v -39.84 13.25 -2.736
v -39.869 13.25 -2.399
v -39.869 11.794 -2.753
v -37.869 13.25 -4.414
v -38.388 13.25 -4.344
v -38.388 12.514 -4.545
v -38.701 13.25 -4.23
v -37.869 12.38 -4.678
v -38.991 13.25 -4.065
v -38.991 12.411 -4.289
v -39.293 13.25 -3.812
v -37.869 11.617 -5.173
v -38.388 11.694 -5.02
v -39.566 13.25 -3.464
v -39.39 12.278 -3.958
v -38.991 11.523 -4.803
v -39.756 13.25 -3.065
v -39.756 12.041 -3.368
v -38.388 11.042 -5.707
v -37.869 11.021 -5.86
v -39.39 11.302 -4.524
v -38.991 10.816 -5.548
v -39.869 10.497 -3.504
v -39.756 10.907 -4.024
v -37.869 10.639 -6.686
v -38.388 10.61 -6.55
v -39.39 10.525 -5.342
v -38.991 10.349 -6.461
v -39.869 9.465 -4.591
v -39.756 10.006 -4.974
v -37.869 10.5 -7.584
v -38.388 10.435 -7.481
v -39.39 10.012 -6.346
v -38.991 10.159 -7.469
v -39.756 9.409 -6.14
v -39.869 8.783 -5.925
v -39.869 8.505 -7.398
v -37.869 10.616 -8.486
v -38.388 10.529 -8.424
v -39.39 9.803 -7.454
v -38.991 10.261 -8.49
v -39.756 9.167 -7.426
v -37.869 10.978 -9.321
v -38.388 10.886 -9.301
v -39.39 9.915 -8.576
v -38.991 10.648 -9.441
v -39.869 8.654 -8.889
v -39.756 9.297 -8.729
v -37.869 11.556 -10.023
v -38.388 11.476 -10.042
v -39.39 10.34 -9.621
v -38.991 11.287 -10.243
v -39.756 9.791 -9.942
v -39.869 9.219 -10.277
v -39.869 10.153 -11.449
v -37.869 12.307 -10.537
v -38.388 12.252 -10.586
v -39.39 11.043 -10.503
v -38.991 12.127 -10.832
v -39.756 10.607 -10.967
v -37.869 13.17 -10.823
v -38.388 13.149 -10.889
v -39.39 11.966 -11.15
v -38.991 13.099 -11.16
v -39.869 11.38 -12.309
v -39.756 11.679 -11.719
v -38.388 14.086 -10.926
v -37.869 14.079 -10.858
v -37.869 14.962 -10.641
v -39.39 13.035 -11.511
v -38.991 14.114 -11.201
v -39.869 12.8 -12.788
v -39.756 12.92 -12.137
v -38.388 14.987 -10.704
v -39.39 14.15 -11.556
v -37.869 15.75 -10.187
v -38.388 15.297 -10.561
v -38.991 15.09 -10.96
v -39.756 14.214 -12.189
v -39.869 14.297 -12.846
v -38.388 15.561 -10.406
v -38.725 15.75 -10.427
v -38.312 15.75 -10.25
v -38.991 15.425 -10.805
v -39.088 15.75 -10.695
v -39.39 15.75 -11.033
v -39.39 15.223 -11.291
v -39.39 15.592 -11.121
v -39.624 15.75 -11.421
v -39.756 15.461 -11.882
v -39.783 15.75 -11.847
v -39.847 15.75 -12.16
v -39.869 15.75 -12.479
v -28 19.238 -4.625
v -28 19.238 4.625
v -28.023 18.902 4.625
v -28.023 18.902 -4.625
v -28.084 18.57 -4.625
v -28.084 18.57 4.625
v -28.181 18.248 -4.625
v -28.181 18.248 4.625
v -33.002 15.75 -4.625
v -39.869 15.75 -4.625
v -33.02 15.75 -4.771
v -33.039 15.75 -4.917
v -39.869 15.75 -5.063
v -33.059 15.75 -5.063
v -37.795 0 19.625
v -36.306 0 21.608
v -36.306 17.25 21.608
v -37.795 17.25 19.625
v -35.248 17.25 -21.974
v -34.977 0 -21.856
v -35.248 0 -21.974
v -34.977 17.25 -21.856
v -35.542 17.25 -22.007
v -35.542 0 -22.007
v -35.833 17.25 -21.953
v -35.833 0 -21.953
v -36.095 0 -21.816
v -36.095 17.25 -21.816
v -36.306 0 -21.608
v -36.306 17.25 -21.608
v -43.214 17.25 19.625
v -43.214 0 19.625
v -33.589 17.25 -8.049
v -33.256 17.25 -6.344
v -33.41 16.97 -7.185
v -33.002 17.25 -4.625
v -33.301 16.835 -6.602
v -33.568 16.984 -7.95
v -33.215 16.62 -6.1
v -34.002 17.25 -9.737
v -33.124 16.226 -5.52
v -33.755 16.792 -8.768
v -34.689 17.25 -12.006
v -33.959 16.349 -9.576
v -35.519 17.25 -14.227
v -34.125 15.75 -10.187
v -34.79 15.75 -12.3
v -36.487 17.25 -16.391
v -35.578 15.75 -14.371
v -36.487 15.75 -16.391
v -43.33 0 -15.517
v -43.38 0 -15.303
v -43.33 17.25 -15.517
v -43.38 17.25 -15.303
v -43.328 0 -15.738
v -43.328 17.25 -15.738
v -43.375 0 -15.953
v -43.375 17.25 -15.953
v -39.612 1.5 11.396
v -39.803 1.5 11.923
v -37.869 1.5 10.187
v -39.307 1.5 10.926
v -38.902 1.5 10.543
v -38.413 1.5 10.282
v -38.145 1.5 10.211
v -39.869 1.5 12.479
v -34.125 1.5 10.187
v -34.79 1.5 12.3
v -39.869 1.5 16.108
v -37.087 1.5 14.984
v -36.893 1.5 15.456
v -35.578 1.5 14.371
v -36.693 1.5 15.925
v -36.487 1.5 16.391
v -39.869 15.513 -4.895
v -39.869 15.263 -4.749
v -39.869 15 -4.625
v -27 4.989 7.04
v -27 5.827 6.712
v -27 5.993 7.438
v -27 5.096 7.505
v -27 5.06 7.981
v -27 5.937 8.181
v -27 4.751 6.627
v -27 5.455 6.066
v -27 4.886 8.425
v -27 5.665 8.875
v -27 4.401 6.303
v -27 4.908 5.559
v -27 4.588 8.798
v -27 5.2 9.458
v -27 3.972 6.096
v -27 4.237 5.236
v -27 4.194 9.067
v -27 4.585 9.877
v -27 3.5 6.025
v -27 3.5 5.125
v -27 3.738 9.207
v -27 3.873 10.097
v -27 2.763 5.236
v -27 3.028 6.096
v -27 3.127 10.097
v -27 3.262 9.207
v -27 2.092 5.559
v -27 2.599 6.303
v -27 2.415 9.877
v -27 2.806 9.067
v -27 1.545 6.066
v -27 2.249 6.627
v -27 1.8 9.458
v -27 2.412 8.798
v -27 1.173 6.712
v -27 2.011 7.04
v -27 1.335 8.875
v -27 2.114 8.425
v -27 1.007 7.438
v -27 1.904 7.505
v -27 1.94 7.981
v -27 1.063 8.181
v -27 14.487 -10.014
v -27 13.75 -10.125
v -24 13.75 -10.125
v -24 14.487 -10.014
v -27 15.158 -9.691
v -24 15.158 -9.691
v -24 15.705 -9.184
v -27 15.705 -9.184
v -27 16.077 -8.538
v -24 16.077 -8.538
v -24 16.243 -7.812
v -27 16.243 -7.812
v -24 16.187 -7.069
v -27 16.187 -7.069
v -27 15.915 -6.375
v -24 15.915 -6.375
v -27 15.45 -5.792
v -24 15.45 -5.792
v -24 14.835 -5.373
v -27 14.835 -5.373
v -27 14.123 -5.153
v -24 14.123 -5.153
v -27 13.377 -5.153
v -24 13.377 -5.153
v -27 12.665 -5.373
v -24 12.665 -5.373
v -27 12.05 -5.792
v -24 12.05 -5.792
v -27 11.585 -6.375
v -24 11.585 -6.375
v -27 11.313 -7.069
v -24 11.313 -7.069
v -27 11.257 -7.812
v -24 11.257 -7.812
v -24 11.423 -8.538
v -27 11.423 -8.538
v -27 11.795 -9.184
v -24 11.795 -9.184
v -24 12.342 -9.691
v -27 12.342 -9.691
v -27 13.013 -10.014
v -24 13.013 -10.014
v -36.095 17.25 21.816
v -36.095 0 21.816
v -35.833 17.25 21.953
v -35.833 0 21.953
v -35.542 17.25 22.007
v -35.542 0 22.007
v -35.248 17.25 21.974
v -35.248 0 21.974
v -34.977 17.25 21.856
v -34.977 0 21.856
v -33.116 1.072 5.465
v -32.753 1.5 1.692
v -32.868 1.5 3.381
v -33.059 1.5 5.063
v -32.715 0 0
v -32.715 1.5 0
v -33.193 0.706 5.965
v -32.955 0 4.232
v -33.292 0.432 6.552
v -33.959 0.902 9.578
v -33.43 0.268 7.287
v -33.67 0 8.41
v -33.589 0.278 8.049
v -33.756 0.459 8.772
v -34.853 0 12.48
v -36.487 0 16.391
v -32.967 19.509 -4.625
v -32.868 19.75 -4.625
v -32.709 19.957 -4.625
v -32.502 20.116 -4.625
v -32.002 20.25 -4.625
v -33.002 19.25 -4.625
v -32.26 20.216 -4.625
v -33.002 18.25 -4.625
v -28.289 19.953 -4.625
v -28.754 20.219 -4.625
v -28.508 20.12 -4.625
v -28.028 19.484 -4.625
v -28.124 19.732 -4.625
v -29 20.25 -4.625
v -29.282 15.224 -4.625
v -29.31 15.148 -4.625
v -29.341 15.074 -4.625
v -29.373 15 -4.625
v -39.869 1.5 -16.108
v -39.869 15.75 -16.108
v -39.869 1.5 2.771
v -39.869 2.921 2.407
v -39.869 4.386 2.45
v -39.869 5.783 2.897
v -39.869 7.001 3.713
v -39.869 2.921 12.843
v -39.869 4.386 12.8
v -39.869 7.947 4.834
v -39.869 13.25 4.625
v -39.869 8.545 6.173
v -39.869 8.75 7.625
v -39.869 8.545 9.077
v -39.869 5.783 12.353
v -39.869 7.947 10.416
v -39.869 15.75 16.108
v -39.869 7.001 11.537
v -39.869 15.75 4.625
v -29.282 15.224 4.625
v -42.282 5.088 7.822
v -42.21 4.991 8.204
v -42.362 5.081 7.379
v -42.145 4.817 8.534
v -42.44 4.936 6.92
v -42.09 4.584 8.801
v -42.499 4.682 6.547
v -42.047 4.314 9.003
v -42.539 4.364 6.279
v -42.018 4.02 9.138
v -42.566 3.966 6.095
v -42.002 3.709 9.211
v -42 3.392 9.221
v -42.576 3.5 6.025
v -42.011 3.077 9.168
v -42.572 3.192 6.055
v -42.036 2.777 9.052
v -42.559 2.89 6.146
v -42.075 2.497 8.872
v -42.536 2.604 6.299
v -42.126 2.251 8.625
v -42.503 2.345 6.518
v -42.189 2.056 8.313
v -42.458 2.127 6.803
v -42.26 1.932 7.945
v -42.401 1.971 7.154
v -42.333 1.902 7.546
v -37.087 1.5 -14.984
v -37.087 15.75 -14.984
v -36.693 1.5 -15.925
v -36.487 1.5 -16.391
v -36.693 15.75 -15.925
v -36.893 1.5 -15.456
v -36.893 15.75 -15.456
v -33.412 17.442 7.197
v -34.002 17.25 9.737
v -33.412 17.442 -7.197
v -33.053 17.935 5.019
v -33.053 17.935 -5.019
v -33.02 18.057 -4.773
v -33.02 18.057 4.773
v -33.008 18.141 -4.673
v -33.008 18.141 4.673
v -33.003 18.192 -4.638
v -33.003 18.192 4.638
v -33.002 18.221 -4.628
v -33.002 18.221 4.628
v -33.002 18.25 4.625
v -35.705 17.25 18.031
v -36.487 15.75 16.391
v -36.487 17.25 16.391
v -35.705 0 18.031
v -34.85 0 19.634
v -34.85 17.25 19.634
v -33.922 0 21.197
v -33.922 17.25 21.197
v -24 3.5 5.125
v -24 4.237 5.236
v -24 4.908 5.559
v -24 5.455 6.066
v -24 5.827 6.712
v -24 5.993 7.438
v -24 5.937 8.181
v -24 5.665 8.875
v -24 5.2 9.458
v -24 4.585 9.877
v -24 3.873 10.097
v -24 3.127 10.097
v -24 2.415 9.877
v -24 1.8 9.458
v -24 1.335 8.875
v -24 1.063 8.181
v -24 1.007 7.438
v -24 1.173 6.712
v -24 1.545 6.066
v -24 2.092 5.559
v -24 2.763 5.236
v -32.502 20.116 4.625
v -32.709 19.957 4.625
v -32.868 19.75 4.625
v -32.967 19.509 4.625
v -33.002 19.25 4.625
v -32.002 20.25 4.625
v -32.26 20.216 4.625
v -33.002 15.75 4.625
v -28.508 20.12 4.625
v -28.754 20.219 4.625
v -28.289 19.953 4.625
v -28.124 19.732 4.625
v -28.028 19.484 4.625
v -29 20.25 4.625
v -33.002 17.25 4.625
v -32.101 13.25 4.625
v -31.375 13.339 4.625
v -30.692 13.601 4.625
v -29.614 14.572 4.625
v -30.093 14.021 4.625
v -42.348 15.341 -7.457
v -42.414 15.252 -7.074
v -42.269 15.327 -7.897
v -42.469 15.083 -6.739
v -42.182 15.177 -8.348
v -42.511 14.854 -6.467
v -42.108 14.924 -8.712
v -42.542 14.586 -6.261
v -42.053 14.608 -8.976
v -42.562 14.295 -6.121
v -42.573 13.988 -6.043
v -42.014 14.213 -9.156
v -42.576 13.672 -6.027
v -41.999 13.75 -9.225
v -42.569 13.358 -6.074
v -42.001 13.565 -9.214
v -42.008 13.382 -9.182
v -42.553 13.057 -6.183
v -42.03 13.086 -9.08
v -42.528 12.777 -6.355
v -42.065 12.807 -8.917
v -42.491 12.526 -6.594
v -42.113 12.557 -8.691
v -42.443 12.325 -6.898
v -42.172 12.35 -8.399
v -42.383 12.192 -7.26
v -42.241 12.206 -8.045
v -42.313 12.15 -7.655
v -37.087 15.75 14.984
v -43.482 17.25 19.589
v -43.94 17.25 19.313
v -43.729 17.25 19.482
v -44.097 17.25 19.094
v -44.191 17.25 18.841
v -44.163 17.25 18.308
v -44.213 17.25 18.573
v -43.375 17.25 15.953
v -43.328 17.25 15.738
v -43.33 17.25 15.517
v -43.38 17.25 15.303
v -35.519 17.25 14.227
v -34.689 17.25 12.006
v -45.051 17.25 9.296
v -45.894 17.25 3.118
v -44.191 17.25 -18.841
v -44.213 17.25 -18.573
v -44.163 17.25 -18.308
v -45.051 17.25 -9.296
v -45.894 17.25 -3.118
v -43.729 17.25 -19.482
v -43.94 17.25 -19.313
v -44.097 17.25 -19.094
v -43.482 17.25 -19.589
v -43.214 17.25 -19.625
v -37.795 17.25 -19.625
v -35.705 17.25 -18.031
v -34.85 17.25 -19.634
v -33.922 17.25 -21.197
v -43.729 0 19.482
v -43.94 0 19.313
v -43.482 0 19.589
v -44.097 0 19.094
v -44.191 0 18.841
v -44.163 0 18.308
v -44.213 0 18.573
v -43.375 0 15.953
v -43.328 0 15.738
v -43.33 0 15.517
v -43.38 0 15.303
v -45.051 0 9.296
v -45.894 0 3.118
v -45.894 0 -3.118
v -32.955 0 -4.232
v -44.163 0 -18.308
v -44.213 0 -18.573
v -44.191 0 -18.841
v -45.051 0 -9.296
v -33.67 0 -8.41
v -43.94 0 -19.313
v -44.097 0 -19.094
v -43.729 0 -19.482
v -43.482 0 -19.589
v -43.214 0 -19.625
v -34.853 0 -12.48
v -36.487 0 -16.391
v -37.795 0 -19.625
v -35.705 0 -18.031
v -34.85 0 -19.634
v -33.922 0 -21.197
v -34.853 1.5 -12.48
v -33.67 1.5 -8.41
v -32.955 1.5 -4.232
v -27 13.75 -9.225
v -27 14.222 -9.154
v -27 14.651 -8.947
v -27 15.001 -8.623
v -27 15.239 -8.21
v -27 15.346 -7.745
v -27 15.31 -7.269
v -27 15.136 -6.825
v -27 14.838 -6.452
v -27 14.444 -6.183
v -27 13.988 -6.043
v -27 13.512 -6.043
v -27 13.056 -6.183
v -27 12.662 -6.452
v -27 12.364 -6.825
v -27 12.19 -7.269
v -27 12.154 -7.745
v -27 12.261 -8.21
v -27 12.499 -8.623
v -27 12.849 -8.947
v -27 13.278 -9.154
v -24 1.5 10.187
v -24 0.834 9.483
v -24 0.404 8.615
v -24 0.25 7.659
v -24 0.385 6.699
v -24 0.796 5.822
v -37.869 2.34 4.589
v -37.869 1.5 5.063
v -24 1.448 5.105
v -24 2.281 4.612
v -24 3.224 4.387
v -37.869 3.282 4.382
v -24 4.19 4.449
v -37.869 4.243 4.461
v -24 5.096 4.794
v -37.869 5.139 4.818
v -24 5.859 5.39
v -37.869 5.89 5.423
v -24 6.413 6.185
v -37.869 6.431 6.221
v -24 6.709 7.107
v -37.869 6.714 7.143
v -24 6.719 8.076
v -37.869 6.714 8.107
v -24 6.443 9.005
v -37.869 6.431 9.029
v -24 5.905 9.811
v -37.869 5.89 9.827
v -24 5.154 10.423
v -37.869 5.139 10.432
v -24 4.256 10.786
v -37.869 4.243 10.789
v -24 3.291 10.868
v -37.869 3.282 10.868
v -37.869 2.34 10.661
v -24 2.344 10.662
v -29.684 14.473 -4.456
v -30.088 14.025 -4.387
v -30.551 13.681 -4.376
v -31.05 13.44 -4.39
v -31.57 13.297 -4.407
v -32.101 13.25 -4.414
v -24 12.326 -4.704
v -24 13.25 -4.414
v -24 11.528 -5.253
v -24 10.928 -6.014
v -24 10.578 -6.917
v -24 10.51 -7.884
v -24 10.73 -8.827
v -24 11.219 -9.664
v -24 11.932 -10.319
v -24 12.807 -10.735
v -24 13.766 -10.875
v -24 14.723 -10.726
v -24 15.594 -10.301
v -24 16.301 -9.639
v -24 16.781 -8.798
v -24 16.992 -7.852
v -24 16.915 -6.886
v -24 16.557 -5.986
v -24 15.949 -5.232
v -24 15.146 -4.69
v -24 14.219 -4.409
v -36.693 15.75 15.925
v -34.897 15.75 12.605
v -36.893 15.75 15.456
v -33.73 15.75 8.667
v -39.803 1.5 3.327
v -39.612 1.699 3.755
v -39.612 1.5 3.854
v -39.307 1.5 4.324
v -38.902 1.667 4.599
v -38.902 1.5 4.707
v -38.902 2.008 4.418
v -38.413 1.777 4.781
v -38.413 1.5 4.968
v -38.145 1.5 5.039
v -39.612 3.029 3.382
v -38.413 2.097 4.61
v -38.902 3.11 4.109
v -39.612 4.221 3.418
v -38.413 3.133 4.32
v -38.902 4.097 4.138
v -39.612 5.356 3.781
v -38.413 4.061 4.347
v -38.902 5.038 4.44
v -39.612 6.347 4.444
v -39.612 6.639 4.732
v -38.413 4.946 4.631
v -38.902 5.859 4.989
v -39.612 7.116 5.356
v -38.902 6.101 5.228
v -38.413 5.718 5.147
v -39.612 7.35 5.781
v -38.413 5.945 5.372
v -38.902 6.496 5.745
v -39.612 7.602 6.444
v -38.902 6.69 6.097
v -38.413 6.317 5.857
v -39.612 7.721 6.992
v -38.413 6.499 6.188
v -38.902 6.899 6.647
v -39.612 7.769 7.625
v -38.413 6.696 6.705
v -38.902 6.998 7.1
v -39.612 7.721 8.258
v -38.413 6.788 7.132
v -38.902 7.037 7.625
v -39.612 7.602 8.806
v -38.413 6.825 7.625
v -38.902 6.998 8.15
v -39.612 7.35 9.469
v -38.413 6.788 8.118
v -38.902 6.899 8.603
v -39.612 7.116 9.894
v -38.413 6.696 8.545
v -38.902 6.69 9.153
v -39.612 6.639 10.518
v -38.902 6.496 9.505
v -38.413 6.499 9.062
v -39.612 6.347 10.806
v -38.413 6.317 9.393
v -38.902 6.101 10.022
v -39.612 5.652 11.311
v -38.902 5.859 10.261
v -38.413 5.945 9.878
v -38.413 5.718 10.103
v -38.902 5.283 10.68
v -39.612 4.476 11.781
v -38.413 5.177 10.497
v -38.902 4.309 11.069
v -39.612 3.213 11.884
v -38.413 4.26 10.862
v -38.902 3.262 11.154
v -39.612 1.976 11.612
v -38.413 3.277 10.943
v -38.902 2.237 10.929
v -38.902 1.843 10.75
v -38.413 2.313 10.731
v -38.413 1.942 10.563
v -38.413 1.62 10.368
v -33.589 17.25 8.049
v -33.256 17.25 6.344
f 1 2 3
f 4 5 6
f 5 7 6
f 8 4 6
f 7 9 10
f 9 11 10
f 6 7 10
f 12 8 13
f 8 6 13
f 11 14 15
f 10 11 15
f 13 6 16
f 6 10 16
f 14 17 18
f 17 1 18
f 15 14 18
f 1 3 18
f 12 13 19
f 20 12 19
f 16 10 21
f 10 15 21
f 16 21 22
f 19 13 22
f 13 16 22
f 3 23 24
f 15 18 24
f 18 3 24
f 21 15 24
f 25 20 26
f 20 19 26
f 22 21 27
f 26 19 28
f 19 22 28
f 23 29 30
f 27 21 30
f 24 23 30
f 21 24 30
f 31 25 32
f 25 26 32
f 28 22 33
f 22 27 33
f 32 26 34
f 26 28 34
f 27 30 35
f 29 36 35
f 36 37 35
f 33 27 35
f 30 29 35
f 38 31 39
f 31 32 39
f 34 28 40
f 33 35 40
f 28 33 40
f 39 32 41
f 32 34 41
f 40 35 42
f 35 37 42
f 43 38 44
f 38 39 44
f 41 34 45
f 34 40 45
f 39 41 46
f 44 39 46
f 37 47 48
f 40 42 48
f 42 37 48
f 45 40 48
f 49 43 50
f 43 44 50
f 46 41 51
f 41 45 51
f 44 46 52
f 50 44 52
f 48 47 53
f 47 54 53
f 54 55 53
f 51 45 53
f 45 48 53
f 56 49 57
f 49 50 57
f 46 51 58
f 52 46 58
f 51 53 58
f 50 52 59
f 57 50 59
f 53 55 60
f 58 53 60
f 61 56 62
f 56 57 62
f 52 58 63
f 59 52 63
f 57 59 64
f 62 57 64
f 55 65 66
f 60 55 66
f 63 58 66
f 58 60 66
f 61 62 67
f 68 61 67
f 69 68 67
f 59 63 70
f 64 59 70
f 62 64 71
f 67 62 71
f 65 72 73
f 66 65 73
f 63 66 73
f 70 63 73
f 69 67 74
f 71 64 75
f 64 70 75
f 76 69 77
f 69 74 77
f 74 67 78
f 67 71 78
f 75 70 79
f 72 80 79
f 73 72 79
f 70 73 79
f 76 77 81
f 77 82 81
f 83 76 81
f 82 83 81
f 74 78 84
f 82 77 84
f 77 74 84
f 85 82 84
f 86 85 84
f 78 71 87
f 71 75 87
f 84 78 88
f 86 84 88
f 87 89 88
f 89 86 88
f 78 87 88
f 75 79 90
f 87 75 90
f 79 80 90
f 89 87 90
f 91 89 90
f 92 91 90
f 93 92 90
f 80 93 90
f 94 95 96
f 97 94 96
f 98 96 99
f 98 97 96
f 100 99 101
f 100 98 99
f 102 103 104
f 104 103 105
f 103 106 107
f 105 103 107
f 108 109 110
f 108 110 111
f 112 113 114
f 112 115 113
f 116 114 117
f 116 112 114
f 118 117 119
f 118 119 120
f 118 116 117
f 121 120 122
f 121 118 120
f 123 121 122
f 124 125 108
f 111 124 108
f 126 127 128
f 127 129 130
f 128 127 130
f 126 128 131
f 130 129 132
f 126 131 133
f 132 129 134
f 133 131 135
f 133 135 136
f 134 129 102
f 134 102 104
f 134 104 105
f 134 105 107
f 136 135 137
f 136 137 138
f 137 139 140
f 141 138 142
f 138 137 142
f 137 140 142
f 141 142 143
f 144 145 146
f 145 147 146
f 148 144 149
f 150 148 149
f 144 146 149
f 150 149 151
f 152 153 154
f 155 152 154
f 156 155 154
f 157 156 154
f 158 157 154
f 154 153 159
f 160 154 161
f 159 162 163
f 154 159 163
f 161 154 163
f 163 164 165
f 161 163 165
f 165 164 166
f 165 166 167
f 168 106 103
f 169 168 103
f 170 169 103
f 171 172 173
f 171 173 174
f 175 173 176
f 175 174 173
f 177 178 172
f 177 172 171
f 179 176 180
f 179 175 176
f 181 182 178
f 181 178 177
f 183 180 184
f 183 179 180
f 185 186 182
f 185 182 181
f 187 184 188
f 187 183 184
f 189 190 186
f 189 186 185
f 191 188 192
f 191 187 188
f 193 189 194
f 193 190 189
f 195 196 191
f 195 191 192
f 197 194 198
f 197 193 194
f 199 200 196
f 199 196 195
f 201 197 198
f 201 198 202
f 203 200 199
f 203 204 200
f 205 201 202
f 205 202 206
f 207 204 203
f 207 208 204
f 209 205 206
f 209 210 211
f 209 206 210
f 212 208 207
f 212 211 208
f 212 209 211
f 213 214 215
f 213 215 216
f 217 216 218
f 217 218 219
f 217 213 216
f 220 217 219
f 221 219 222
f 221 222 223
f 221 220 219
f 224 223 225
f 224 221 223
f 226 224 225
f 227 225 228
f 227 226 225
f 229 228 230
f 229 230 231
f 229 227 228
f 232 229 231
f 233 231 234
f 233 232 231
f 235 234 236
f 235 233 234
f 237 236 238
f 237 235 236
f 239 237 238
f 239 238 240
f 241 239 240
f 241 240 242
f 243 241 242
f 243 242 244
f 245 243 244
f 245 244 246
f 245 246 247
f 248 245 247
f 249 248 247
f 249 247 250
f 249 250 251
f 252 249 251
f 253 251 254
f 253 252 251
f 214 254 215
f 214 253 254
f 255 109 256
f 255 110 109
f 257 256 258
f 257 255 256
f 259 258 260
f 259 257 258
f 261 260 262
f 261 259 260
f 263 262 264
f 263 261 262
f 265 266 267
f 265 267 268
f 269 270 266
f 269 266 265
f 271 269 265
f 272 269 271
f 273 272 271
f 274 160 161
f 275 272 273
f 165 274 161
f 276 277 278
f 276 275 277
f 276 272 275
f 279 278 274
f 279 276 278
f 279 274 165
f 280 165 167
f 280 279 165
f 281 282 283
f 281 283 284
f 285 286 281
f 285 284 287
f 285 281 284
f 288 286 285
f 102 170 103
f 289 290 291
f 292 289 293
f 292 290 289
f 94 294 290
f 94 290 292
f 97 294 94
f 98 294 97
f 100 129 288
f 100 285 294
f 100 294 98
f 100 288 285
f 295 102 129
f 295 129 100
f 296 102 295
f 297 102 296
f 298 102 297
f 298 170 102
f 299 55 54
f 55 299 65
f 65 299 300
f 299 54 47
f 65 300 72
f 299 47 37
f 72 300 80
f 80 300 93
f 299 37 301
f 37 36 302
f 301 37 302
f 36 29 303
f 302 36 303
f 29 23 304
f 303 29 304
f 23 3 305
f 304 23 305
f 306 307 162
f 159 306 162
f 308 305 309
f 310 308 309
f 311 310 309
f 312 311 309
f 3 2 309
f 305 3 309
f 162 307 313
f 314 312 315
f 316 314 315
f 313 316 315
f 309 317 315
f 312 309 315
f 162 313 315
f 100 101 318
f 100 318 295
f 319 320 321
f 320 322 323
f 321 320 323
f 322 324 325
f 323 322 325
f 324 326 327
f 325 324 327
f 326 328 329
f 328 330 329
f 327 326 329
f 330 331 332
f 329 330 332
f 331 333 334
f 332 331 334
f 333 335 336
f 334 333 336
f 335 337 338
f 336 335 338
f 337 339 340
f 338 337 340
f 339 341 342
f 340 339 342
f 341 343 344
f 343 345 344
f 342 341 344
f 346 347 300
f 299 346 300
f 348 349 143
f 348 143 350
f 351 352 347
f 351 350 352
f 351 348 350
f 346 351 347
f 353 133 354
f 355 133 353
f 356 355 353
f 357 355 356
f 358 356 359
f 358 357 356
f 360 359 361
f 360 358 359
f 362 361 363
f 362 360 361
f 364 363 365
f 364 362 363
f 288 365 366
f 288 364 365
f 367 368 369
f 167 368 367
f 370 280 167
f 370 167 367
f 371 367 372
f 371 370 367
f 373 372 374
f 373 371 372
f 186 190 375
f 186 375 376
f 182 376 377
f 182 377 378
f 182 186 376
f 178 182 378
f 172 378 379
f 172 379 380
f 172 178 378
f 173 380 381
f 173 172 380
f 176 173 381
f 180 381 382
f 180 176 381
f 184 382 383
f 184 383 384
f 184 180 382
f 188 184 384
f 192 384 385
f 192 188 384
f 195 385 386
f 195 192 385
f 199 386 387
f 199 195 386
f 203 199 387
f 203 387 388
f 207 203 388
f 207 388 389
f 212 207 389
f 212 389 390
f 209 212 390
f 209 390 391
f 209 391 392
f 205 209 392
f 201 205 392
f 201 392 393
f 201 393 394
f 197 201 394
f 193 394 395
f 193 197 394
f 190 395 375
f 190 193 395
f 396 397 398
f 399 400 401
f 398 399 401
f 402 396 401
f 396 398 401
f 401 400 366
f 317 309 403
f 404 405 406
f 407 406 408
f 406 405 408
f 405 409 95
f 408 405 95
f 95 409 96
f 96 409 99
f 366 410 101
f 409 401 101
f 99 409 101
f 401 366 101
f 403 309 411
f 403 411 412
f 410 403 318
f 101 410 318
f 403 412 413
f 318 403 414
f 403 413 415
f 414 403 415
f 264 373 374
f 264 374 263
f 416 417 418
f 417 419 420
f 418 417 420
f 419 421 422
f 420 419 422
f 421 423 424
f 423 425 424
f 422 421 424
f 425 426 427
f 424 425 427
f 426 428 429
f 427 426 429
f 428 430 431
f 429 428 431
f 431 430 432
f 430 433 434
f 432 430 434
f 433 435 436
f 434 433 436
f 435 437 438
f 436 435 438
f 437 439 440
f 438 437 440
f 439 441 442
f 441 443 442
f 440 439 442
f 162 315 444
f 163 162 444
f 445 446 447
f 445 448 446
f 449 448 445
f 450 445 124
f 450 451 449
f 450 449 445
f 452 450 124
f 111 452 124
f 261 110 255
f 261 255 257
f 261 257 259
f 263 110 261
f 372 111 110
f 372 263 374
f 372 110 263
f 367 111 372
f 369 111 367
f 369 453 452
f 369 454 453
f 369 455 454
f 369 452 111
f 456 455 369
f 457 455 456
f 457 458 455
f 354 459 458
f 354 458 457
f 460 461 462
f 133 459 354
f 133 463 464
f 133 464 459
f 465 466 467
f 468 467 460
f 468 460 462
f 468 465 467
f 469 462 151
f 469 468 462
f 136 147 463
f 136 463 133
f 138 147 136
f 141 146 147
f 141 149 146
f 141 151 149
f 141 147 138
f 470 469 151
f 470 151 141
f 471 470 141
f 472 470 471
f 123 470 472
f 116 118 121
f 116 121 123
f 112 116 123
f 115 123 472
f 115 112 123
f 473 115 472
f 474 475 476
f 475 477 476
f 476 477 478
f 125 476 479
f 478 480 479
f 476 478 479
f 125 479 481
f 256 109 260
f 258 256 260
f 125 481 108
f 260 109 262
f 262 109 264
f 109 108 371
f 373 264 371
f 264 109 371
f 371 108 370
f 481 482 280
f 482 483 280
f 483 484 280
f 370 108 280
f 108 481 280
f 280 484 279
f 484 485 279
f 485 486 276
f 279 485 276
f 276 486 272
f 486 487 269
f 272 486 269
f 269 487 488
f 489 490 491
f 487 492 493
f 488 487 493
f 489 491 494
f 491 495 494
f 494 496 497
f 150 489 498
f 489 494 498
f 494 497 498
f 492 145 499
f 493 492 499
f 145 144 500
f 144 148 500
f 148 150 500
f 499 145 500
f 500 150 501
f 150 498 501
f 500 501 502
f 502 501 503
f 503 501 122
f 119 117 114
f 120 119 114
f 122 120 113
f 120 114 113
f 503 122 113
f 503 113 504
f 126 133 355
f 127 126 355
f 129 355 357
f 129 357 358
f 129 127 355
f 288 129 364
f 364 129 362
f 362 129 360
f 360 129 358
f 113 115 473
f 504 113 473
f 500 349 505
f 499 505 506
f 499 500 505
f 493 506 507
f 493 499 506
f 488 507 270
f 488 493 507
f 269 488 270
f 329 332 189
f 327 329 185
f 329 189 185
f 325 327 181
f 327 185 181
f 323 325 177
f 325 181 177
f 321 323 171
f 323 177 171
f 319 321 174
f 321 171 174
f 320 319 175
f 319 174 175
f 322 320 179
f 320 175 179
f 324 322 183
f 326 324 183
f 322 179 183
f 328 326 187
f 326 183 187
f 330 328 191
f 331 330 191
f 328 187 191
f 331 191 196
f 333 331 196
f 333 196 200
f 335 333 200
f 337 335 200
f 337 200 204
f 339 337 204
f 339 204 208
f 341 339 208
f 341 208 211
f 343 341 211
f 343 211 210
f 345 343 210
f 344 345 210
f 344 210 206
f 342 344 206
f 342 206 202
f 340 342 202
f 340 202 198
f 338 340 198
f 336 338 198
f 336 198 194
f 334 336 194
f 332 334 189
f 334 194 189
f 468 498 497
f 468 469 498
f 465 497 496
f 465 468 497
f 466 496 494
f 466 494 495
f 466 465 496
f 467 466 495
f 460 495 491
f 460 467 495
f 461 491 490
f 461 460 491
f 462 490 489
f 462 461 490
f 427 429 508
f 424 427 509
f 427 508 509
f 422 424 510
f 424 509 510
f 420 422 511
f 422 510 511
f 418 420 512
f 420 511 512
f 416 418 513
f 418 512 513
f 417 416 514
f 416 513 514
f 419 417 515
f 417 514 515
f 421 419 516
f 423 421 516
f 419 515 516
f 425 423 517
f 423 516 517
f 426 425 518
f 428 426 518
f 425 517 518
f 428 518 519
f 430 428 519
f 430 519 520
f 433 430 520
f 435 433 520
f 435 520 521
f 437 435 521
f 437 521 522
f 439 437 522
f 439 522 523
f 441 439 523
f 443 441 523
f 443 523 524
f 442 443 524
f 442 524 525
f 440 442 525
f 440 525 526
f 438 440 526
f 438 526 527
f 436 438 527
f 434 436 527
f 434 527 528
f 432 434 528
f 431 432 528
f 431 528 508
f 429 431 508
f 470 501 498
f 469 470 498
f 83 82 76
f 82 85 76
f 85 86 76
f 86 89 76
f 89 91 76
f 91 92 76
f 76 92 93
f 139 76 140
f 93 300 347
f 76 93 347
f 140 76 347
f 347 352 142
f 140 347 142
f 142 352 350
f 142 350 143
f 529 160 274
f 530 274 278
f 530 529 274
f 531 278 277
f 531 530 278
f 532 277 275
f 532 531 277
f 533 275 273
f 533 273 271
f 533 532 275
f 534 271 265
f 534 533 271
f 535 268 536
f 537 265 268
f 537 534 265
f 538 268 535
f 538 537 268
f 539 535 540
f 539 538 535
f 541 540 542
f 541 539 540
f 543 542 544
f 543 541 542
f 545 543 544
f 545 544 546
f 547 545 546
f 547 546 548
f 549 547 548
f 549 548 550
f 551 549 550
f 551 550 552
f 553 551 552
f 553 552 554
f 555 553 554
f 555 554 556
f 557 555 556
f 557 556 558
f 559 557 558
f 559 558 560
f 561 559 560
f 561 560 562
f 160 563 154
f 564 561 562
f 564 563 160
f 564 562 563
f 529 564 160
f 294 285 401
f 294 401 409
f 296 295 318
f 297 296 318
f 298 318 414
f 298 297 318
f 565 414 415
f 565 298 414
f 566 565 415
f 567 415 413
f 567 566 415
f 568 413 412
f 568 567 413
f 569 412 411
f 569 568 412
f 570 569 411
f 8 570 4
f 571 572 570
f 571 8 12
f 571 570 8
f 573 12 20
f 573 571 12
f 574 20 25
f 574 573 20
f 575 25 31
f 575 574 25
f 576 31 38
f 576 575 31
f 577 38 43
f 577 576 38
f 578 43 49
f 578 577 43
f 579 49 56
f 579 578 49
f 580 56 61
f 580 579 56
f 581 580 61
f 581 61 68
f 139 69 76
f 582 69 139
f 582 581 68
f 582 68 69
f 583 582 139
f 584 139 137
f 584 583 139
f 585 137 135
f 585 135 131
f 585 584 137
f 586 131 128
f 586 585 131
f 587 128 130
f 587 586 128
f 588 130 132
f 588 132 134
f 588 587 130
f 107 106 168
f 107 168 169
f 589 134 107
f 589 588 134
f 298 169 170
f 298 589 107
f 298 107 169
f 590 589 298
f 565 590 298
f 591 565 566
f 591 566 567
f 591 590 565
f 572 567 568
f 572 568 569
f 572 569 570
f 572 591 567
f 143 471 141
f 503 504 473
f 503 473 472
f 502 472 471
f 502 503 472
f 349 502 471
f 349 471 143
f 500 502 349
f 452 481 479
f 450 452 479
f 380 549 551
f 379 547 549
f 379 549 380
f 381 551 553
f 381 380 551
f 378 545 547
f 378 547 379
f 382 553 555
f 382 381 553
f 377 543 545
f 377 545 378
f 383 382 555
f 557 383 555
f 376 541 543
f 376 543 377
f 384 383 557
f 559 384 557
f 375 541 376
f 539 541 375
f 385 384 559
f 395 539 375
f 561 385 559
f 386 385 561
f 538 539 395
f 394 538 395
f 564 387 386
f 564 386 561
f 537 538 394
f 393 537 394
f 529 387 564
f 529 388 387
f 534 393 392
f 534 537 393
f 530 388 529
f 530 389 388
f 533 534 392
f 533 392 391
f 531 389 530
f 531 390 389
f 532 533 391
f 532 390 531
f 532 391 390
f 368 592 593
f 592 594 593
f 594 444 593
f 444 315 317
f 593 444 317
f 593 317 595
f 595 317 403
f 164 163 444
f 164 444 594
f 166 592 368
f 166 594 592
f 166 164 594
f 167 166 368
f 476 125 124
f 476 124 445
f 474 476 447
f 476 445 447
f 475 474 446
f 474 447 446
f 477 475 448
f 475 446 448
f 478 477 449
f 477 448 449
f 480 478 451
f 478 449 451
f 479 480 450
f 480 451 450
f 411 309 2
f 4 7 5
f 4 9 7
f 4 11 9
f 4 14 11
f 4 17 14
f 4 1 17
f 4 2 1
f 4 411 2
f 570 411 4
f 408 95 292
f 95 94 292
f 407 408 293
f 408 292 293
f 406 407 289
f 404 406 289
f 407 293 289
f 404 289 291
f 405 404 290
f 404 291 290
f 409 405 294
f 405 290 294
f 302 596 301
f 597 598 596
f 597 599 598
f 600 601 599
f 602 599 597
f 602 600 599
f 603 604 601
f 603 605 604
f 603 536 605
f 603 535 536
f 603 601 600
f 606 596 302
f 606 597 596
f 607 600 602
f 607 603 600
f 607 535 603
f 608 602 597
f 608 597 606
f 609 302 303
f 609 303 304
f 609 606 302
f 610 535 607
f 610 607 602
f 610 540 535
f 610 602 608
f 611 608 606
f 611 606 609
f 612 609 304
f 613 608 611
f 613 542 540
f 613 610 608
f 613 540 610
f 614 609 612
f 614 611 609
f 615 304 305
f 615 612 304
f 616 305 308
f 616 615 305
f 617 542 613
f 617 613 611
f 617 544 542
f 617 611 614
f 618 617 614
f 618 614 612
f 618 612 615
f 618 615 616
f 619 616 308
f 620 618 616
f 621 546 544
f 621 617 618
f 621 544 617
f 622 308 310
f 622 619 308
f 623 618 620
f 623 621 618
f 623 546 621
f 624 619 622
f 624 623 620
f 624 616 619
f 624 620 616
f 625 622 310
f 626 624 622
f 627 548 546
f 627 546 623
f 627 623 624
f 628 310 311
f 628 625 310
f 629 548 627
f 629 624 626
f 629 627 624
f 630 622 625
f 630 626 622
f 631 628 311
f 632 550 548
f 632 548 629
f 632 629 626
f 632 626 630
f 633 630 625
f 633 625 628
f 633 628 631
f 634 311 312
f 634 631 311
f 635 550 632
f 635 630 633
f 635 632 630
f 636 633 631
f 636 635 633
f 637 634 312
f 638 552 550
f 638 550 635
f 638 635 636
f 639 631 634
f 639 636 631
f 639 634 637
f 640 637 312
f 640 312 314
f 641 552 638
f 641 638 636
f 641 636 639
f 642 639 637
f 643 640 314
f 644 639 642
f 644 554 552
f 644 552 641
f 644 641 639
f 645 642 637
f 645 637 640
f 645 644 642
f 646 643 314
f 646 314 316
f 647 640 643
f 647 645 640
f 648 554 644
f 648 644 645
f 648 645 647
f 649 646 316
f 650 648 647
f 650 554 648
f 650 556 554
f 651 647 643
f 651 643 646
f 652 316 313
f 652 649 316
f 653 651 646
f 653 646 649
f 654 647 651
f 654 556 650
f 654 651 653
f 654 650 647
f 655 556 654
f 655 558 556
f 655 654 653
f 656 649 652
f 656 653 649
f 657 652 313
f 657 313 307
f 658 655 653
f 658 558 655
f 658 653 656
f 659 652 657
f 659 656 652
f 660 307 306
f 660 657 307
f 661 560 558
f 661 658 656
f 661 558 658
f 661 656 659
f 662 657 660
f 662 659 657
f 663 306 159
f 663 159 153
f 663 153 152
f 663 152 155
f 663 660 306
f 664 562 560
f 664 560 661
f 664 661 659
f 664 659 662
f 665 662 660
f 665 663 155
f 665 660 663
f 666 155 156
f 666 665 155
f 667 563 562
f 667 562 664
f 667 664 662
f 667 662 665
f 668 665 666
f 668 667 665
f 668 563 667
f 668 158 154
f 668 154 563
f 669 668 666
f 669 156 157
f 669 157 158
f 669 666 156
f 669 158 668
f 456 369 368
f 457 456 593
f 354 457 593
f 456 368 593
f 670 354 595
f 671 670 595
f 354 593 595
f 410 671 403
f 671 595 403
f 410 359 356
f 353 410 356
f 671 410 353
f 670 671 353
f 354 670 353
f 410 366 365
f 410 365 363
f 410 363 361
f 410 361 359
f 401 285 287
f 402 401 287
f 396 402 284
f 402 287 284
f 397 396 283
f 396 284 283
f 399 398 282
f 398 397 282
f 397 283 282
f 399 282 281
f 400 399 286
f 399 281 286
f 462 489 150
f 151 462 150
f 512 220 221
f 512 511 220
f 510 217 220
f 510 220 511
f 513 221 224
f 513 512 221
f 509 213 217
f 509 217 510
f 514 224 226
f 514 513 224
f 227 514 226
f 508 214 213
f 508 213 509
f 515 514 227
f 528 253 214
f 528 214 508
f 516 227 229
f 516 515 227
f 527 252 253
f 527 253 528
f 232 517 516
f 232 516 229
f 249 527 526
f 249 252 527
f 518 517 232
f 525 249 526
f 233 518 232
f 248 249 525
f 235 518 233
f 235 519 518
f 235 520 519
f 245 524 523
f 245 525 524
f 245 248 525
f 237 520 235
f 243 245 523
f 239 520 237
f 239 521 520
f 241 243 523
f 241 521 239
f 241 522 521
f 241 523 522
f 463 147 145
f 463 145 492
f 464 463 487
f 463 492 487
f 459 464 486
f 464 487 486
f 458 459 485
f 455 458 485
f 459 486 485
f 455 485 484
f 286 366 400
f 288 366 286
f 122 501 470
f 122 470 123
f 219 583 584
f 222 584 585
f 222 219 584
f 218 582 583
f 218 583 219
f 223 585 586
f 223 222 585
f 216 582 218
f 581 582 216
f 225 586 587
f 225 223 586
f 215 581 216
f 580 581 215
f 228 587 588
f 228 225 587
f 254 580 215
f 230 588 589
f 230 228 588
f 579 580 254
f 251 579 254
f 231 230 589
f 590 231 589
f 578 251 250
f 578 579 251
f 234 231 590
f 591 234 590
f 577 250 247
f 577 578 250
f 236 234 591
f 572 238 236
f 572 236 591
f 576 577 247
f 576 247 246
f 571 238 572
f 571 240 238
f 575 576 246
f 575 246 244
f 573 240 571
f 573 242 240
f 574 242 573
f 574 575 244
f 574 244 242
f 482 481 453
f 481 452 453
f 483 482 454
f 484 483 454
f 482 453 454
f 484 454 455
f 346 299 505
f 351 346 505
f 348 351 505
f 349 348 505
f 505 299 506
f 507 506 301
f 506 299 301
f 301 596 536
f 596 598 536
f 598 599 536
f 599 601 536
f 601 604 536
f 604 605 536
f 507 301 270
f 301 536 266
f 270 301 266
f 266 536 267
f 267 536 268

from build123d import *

# Parameters (mm, degrees)
BOSS_EXTRUDE1_DEPTH              = 17.25
CUT_EXTRUDE1_REACH               = 33.729
CUT_EXTRUDE1_END_RADIUS          = 43
SKETCH2_W                        = 9.25
SKETCH2_H                        = 13.25
BOSS_EXTRUDE2_REACH              = 33.729
BOSS_EXTRUDE2_END_RADIUS         = 43
SKETCH4_R                        = 2.5
SKETCH4_R_2                      = 1.6
BOSS_EXTRUDE3_DEPTH              = 1.5
BOSS_EXTRUDE4_START              = -1.5
BOSS_EXTRUDE4_DEPTH              = 1.5
SKETCH9_W                        = 5.001518559
SKETCH9_H                        = 9.25
BOSS_EXTRUDE5_DEPTH              = 3
CHAMFER1_SIZE                    = 2
CHAMFER1_SIZE2                   = 5.494954839
FILLET1_R                        = 3
FILLET2_R                        = 1
FILLET3_R                        = 1
BOSS_EXTRUDE8_REACH              = 55.956
CHAMFER2_START                   = -1
CHAMFER2_DEPTH                   = 19
FILLET5_R                        = 1
BOSS_EXTRUDE9_REACH              = 34.176
BOSS_EXTRUDE10_START             = 1
SKETCH15_R                       = 2.5
SKETCH15_R_2                     = 1.6
BOSS_EXTRUDE10_DEPTH             = 1
BOSS_EXTRUDE11_REACH             = 37.432
SKETCH16_R                       = 3.25
SKETCH16_R_2                     = 2.5
BOSS_EXTRUDE11_DIRECTION_2_DEPTH = 3
FILLET6_R                        = 2
BOSS_EXTRUDE12_START             = -17.25
BOSS_EXTRUDE12_DEPTH             = 17.25
FILLET7_R                        = 1


with BuildPart() as part:
    # Sketch1 → Boss-Extrude1 (new body)
    with BuildSketch(Plane(origin=(0, 0, 0), x_dir=(1, 0, 0), z_dir=(0, 1, 0))):
        with BuildLine():
            ThreePointArc((-42.750548242, 4.625), (-41.193980767, 12.331096812), (-38.260415249, 19.625))
            Line((-38.260415249, 19.625), (-41.603598102, 19.625))
            ThreePointArc((-41.603598102, 19.625), (-46, 0), (-41.603598102, -19.625))
            Line((-41.603598102, -19.625), (-38.260415249, -19.625))
            ThreePointArc((-38.260415249, -19.625), (-41.193980767, -12.331096812), (-42.750548242, -4.625))
            Line((-42.750548242, -4.625), (-28, -4.625))
            Line((-28, -4.625), (-28, 4.625))
            Line((-28, 4.625), (-42.750548242, 4.625))
        make_face()
    extrude(amount=BOSS_EXTRUDE1_DEPTH)

    # Cut-Extrude1: up to this cylinder (the profile starts inside it)
    cut_extrude1_end = Plane(origin=(0, 6.625, 0), z_dir=(0, -1, 0)) * Cylinder(CUT_EXTRUDE1_END_RADIUS, 154.458, mode=Mode.PRIVATE)
    # Sketch2 → Cut-Extrude1 (cut, up to the surface)
    with BuildSketch(Plane(origin=(-28, 0, 0), x_dir=(0, 0, -1), z_dir=(1, 0, 0)), mode=Mode.PRIVATE) as cut_extrude1_sk1:
        with Locations((0, 6.625)):
            Rectangle(SKETCH2_W, SKETCH2_H)
    cut_extrude1_tool1 = extrude(cut_extrude1_sk1.sketch, amount=-CUT_EXTRUDE1_REACH, mode=Mode.PRIVATE) & cut_extrude1_end
    add(cut_extrude1_tool1.solids().sort_by_distance((-28, 6.625, 0))[0], mode=Mode.SUBTRACT)

    # Boss-Extrude2: up to this cylinder (the profile starts inside it)
    boss_extrude2_end = Plane(origin=(0, 8.625, 0), z_dir=(0, -1, 0)) * Cylinder(BOSS_EXTRUDE2_END_RADIUS, 164.708, mode=Mode.PRIVATE)
    # Sketch4 → Boss-Extrude2 (add, up to the surface)
    with BuildSketch(Plane(origin=(-28, 0, 0), x_dir=(0, 0, -1), z_dir=(1, 0, 0)), mode=Mode.PRIVATE) as boss_extrude2_sk1:
        with Locations((-7.625, 3.5)):
            Circle(SKETCH4_R)
        with Locations((-7.625, 3.5)):
            Circle(SKETCH4_R_2, mode=Mode.SUBTRACT)
    boss_extrude2_tool1 = extrude(boss_extrude2_sk1.sketch, amount=-BOSS_EXTRUDE2_REACH, mode=Mode.PRIVATE) & boss_extrude2_end
    add(boss_extrude2_tool1.solids().sort_by_distance((-28, 3.5, 10.054289))[0])
    # Sketch4 → Boss-Extrude2 (add, up to the surface)
    with BuildSketch(Plane(origin=(-28, 0, 0), x_dir=(0, 0, -1), z_dir=(1, 0, 0)), mode=Mode.PRIVATE) as boss_extrude2_sk2:
        with Locations((7.625, 13.75)):
            Circle(SKETCH4_R)
        with Locations((7.625, 13.75)):
            Circle(SKETCH4_R_2, mode=Mode.SUBTRACT)
    boss_extrude2_tool2 = extrude(boss_extrude2_sk2.sketch, amount=-BOSS_EXTRUDE2_REACH, mode=Mode.PRIVATE) & boss_extrude2_end
    add(boss_extrude2_tool2.solids().sort_by_distance((-28, 13.75, -5.195711))[0])

    # Sketch7 → Boss-Extrude3 (add)
    with BuildSketch(Plane.XZ):
        with BuildLine():
            ThreePointArc((-38.260415249, 19.625), (-43, 0), (-38.260415249, -19.625))
            ThreePointArc((-38.260415249, -19.625), (-34.128134601, -10.196688741), (-32.715217313, 0))
            ThreePointArc((-32.715217313, 0), (-34.128134601, 10.196688741), (-38.260415249, 19.625))
        make_face()
    extrude(amount=-BOSS_EXTRUDE3_DEPTH)

    # Sketch8 → Boss-Extrude4 (add)
    with BuildSketch(Plane(origin=(0, 17.25, 0), x_dir=(1, 0, 0), z_dir=(0, 1, 0)).offset(BOSS_EXTRUDE4_START)):
        with BuildLine():
            Line((-42.750548242, 4.625), (-33.001518559, 4.625))
            ThreePointArc((-33.001518559, 4.625), (-34.827078391, 12.406837776), (-38.260415249, 19.625))
            ThreePointArc((-38.260415249, 19.625), (-41.193980767, 12.331096812), (-42.750548242, 4.625))
        make_face()
        with BuildLine():
            ThreePointArc((-38.260415249, -19.625), (-34.827078391, -12.406837776), (-33.001518559, -4.625))
            Line((-33.001518559, -4.625), (-42.750548242, -4.625))
            ThreePointArc((-42.750548242, -4.625), (-41.193980767, -12.331096812), (-38.260415249, -19.625))
        make_face()
    extrude(amount=BOSS_EXTRUDE4_DEPTH)

    # Sketch9 → Boss-Extrude5 (add)
    with BuildSketch(Plane(origin=(0, 17.25, 0), x_dir=(1, 0, 0), z_dir=(0, 1, 0))):
        with Locations((-30.50075928, 0)):
            Rectangle(SKETCH9_W, SKETCH9_H)
    extrude(amount=BOSS_EXTRUDE5_DEPTH)

    # Chamfer1
    chamfer1_edges = [part.edges().sort_by_distance(p)[0] for p in [
        (-28, 13.25, 0),
    ]]
    chamfer1_side = [part.faces().sort_by_distance(p)[0] for p in [
        (-35.458658311, 13.25, 0),
    ]]
    chamfer(chamfer1_edges, length=CHAMFER1_SIZE, length2=CHAMFER1_SIZE2, reference=chamfer1_side[0])

    # Fillet1
    fillet1_edges = [part.edges().sort_by_distance(p)[0] for p in [
        (-28, 18.744954839, 0),
        (-30, 13.25, 0),
    ]]
    fillet(fillet1_edges, radius=FILLET1_R)

    # Fillet2
    fillet2_edges = [part.edges().sort_by_distance(p)[0] for p in [
        (-28, 20.25, 0),
    ]]
    fillet(fillet2_edges, radius=FILLET2_R)

    # Fillet3
    # the kernel refuses this fillet: 1 mm, written as the material it adds along each edge
    with BuildSketch(Plane(origin=(-33.001518559, 17.25, -12.125), x_dir=(0, 1, 0), z_dir=(0, 0, 1))) as fillet3_piece_1_section:
        with BuildLine():
            CenterArc((FILLET3_R, FILLET3_R), FILLET3_R, 180, 90)
            Line((0, FILLET3_R), (0, 0))
            Line((0, 0), (FILLET3_R, 0))
        make_face()
    fillet3_piece_1 = extrude(amount=24.25, mode=Mode.PRIVATE)
    fillet3_piece_1 = fillet3_piece_1 & Plane(origin=(-70.215217313, 17.25, 0), x_dir=(0.8521280550611038, 0, 0.5233333333333359), z_dir=(0, -1, 0)) * Cylinder(37.5, 53, mode=Mode.PRIVATE)
    add(fillet3_piece_1)
    # the kernel refuses this fillet: 1 mm, written as the material it takes off along each edge
    with BuildSketch(Plane(origin=(-33.001518559, 20.25, -7.125), x_dir=(1, 0, 0), z_dir=(0, 0, 1))) as fillet3_2_piece_1:
        with BuildLine():
            CenterArc((FILLET3_R, -FILLET3_R), FILLET3_R, 90, 90)
            Line((0, -FILLET3_R), (0, 0))
            Line((0, 0), (FILLET3_R, 0))
        make_face()
    extrude(amount=14.25, mode=Mode.SUBTRACT)

    # Boss-Extrude8: up to this face of the body (flat: up to its plane)
    boss_extrude8_end = Plane(part.part.faces().sort_by_distance((-39.752003107, 17.25, 0))[0])
    # Sketch12 → Boss-Extrude8 (add, up to the picked face)
    with BuildSketch(Plane.XZ, mode=Mode.PRIVATE) as boss_extrude8_sk1:
        with BuildLine():
            ThreePointArc((-36.466068135, 22.786528362), (-37.39666623, 21.224734507), (-38.260415249, 19.625))
            ThreePointArc((-38.260415249, 19.625), (-37.334080823, 18.029998977), (-36.487295336, 16.391378193))
            ThreePointArc((-36.487295336, 16.391378193), (-35.286505713, 18.837794844), (-33.921923846, 21.196770569))
            Line((-33.921923846, 21.196770569), (-36.466068135, 22.786528362))
        make_face()
    boss_extrude8_tool1 = split(extrude(boss_extrude8_sk1.sketch, amount=-BOSS_EXTRUDE8_REACH, mode=Mode.PRIVATE), bisect_by=boss_extrude8_end, keep=Keep.BOTH, mode=Mode.PRIVATE)
    # Sketch12 → Boss-Extrude8 (add, up to the picked face)
    with BuildSketch(Plane.XZ, mode=Mode.PRIVATE) as boss_extrude8_sk2:
        with BuildLine():
            ThreePointArc((-36.487295336, 16.391378193), (-37.334080823, 18.029998977), (-38.260415249, 19.625))
            ThreePointArc((-38.260415249, 19.625), (-39.104218125, 17.884633763), (-39.868905746, 16.108083517))
            Line((-39.868905746, 16.108083517), (-37.087354183, 14.984263737))
            ThreePointArc((-37.087354183, 14.984263737), (-36.794051907, 15.690689733), (-36.487295336, 16.391378193))
        make_face()
    boss_extrude8_tool2 = split(extrude(boss_extrude8_sk2.sketch, amount=-BOSS_EXTRUDE8_REACH, mode=Mode.PRIVATE), bisect_by=boss_extrude8_end, keep=Keep.BOTH, mode=Mode.PRIVATE)
    # Sketch12 → Boss-Extrude8 (add, up to the picked face)
    with BuildSketch(Plane.XZ, mode=Mode.PRIVATE) as boss_extrude8_sk3:
        with BuildLine():
            Line((-37.087354183, -14.984263737), (-39.868905746, -16.108083517))
            ThreePointArc((-39.868905746, -16.108083517), (-39.104218125, -17.884633763), (-38.260415249, -19.625))
            ThreePointArc((-38.260415249, -19.625), (-37.334080823, -18.029998977), (-36.487295336, -16.391378193))
            ThreePointArc((-36.487295336, -16.391378193), (-36.794051907, -15.690689733), (-37.087354183, -14.984263737))
        make_face()
    boss_extrude8_tool3 = split(extrude(boss_extrude8_sk3.sketch, amount=-BOSS_EXTRUDE8_REACH, mode=Mode.PRIVATE), bisect_by=boss_extrude8_end, keep=Keep.BOTH, mode=Mode.PRIVATE)
    # Sketch12 → Boss-Extrude8 (add, up to the picked face)
    with BuildSketch(Plane.XZ, mode=Mode.PRIVATE) as boss_extrude8_sk4:
        with BuildLine():
            ThreePointArc((-36.487295336, -16.391378193), (-37.334080823, -18.029998977), (-38.260415249, -19.625))
            ThreePointArc((-38.260415249, -19.625), (-37.39666623, -21.224734507), (-36.466068135, -22.786528362))
            Line((-36.466068135, -22.786528362), (-33.921923846, -21.196770569))
            ThreePointArc((-33.921923846, -21.196770569), (-35.286505713, -18.837794844), (-36.487295336, -16.391378193))
        make_face()
    boss_extrude8_tool4 = split(extrude(boss_extrude8_sk4.sketch, amount=-BOSS_EXTRUDE8_REACH, mode=Mode.PRIVATE), bisect_by=boss_extrude8_end, keep=Keep.BOTH, mode=Mode.PRIVATE)
    add(boss_extrude8_tool1.solids().sort_by(Axis((-36.243564, 0, 19.961261), (0, 1, 0)))[0])
    add(boss_extrude8_tool2.solids().sort_by(Axis((-38.098246, 0, 16.960588), (0, 1, 0)))[0])
    add(boss_extrude8_tool3.solids().sort_by(Axis((-38.098246, 0, -16.960588), (0, 1, 0)))[0])
    add(boss_extrude8_tool4.solids().sort_by(Axis((-36.243564, 0, -19.961261), (0, 1, 0)))[0])

    # Chamfer2: read off the stored shape, not the designer's step
    # Chamfer2 outline → Chamfer2 (cut)
    with BuildSketch(Plane(origin=(0, 0, 0), x_dir=(1, 0, 0), z_dir=(0, 1, 0)).offset(CHAMFER2_START)):
        with BuildLine():
            ThreePointArc((-36.466068135, 22.786528362), (-37.39666623, 21.224734507), (-38.260415249, 19.625))
            Line((-38.260415249, 19.625), (-37.795434487, 19.625))
            Line((-37.795434487, 19.625), (-35.755053439, 22.34223707))
            Line((-35.755053439, 22.34223707), (-36.466068135, 22.786528362))
        make_face()
        with BuildLine():
            Line((-37.795434487, -19.625), (-38.260415249, -19.625))
            ThreePointArc((-38.260415249, -19.625), (-37.39666623, -21.224734507), (-36.466068135, -22.786528362))
            Line((-36.466068135, -22.786528362), (-35.755053439, -22.34223707))
            Line((-35.755053439, -22.34223707), (-37.795434487, -19.625))
        make_face()
    extrude(amount=CHAMFER2_DEPTH, mode=Mode.SUBTRACT)

    # Fillet5
    fillet5_edges = [part.edges().sort_by_distance(p)[0] for p in [
        (-35.755053439, 8.625, -22.34223707),
        (-35.755053439, 8.625, 22.34223707),
    ]]
    fillet(fillet5_edges, radius=FILLET5_R)

    # Sketch14 → Boss-Extrude9 (add, up to next)
    with BuildSketch(Plane.ZY.offset(39.868905746), mode=Mode.PRIVATE) as boss_extrude9_sk1:
        with BuildLine():
            Line((-16.108083517, 15.75), (-16.108083517, 1.5))
            Line((-16.108083517, 1.5), (6.125, 1.5))
            ThreePointArc((6.125, 1.5), (7.625, 6), (9.125, 1.5))
            Line((9.125, 1.5), (16.108083517, 1.5))
            Line((16.108083517, 1.5), (16.108083517, 15.75))
            Line((16.108083517, 15.75), (4.625, 15.75))
            Line((4.625, 15.75), (4.625, 13.25))
            Line((4.625, 13.25), (-4.625, 13.25))
            Line((-4.625, 13.25), (-4.625, 15.75))
            Line((-4.625, 15.75), (-6.125, 15.75))
            ThreePointArc((-6.125, 15.75), (-7.625, 11.25), (-9.125, 15.75))
            Line((-9.125, 15.75), (-16.108083517, 15.75))
        make_face()
    boss_extrude9_tool1 = extrude(boss_extrude9_sk1.sketch, amount=BOSS_EXTRUDE9_REACH, mode=Mode.PRIVATE) - part.part
    add(boss_extrude9_tool1.solids().sort_by_distance((-39.868906, 8.284269, 0))[0])

    # Sketch15 → Boss-Extrude10 (add)
    # profile 1 of 2: a face of its own
    with BuildSketch(Plane(origin=(-28, 0, 0), x_dir=(0, 0, -1), z_dir=(1, 0, 0)).offset(BOSS_EXTRUDE10_START)):
        with Locations((-7.625, 3.5)):
            Circle(SKETCH15_R)
        with Locations((-7.625, 3.5)):
            Circle(SKETCH15_R_2, mode=Mode.SUBTRACT)
    # profile 2 of 2: a face of its own
    with BuildSketch(Plane(origin=(-28, 0, 0), x_dir=(0, 0, -1), z_dir=(1, 0, 0)).offset(BOSS_EXTRUDE10_START)):
        with Locations((7.625, 13.75)):
            Circle(SKETCH15_R)
        with Locations((7.625, 13.75)):
            Circle(SKETCH15_R_2, mode=Mode.SUBTRACT)
    extrude(amount=-BOSS_EXTRUDE10_DEPTH)

    # Boss-Extrude11: up to this face of the body (flat: up to its plane)
    boss_extrude11_end = Plane(part.part.faces().sort_by_distance((-39.868905746, 8.284269091, 0))[0])
    # Sketch16 → Boss-Extrude11 (add, up to the picked face)
    with BuildSketch(Plane(origin=(-27, 0, 0), x_dir=(0, 0, -1), z_dir=(1, 0, 0)), mode=Mode.PRIVATE) as boss_extrude11_sk1:
        with Locations(Location((7.625, 13.75, 0), (0, 0, 188.849883098))):
            Circle(SKETCH16_R)
        with Locations((7.625, 13.75)):
            Circle(SKETCH16_R_2, mode=Mode.SUBTRACT)
    boss_extrude11_tool1 = split(extrude(boss_extrude11_sk1.sketch, amount=-BOSS_EXTRUDE11_REACH, mode=Mode.PRIVATE), bisect_by=boss_extrude11_end, keep=Keep.BOTH, mode=Mode.PRIVATE)
    # Sketch16 → Boss-Extrude11 (add, up to the picked face)
    with BuildSketch(Plane(origin=(-27, 0, 0), x_dir=(0, 0, -1), z_dir=(1, 0, 0)), mode=Mode.PRIVATE) as boss_extrude11_sk2:
        with Locations(Location((-7.625, 3.5, 0), (0, 0, 217.979872445))):
            Circle(SKETCH16_R)
        with Locations((-7.625, 3.5)):
            Circle(SKETCH16_R_2, mode=Mode.SUBTRACT)
    boss_extrude11_tool2 = split(extrude(boss_extrude11_sk2.sketch, amount=-BOSS_EXTRUDE11_REACH, mode=Mode.PRIVATE), bisect_by=boss_extrude11_end, keep=Keep.BOTH, mode=Mode.PRIVATE)
    add(boss_extrude11_tool1.solids().sort_by(Axis((-27, 14.235858, -10.745479), (-1, 0, 0)))[0])
    add(boss_extrude11_tool2.solids().sort_by(Axis((-27, 5.443431, 5.135719), (-1, 0, 0)))[0])

    # Sketch16 → Boss-Extrude11 direction 2 (add)
    # profile 1 of 2: a face of its own
    with BuildSketch(Plane(origin=(-27, 0, 0), x_dir=(0, 0, -1), z_dir=(1, 0, 0))):
        with Locations(Location((7.625, 13.75, 0), (0, 0, 188.849883098))):
            Circle(SKETCH16_R)
        with Locations((7.625, 13.75)):
            Circle(SKETCH16_R_2, mode=Mode.SUBTRACT)
    # profile 2 of 2: a face of its own
    with BuildSketch(Plane(origin=(-27, 0, 0), x_dir=(0, 0, -1), z_dir=(1, 0, 0))):
        with Locations(Location((-7.625, 3.5, 0), (0, 0, 217.979872445))):
            Circle(SKETCH16_R)
        with Locations((-7.625, 3.5)):
            Circle(SKETCH16_R_2, mode=Mode.SUBTRACT)
    extrude(amount=BOSS_EXTRUDE11_DIRECTION_2_DEPTH)

    # Fillet6
    fillet6_edges = [part.edges().sort_by_distance(p)[0] for p in [
        (-39.868905746, 10.767632726, -8.916505108),
        (-39.868905746, 6.75, 7.625),
    ]]
    fillet(fillet6_edges, radius=FILLET6_R)

    # Sketch17 → Boss-Extrude12 (add)
    with BuildSketch(Plane(origin=(0, 17.25, 0), x_dir=(1, 0, 0), z_dir=(0, 1, 0)).offset(BOSS_EXTRUDE12_START)):
        with BuildLine():
            ThreePointArc((-43.264990177, 15.625), (-42.481399684, 17.644565195), (-41.603598102, 19.625))
            Line((-41.603598102, 19.625), (-44.603598102, 19.625))
            Line((-44.603598102, 19.625), (-43.264990177, 15.625))
        make_face()
        with BuildLine():
            ThreePointArc((-41.603598102, -19.625), (-42.481399684, -17.644565195), (-43.264990177, -15.625))
            Line((-43.264990177, -15.625), (-44.603598102, -19.625))
            Line((-44.603598102, -19.625), (-41.603598102, -19.625))
        make_face()
    extrude(amount=BOSS_EXTRUDE12_DEPTH)

    # Fillet7
    fillet7_edges = [part.edges().sort_by_distance(p)[0] for p in [
        (-44.603598102, 8.625, -19.625),
        (-43.264990177, 8.625, -15.625),
        (-44.603598102, 8.625, 19.625),
        (-43.264990177, 8.625, 15.625),
    ]]
    fillet(fillet7_edges, radius=FILLET7_R)


solid = part.part
